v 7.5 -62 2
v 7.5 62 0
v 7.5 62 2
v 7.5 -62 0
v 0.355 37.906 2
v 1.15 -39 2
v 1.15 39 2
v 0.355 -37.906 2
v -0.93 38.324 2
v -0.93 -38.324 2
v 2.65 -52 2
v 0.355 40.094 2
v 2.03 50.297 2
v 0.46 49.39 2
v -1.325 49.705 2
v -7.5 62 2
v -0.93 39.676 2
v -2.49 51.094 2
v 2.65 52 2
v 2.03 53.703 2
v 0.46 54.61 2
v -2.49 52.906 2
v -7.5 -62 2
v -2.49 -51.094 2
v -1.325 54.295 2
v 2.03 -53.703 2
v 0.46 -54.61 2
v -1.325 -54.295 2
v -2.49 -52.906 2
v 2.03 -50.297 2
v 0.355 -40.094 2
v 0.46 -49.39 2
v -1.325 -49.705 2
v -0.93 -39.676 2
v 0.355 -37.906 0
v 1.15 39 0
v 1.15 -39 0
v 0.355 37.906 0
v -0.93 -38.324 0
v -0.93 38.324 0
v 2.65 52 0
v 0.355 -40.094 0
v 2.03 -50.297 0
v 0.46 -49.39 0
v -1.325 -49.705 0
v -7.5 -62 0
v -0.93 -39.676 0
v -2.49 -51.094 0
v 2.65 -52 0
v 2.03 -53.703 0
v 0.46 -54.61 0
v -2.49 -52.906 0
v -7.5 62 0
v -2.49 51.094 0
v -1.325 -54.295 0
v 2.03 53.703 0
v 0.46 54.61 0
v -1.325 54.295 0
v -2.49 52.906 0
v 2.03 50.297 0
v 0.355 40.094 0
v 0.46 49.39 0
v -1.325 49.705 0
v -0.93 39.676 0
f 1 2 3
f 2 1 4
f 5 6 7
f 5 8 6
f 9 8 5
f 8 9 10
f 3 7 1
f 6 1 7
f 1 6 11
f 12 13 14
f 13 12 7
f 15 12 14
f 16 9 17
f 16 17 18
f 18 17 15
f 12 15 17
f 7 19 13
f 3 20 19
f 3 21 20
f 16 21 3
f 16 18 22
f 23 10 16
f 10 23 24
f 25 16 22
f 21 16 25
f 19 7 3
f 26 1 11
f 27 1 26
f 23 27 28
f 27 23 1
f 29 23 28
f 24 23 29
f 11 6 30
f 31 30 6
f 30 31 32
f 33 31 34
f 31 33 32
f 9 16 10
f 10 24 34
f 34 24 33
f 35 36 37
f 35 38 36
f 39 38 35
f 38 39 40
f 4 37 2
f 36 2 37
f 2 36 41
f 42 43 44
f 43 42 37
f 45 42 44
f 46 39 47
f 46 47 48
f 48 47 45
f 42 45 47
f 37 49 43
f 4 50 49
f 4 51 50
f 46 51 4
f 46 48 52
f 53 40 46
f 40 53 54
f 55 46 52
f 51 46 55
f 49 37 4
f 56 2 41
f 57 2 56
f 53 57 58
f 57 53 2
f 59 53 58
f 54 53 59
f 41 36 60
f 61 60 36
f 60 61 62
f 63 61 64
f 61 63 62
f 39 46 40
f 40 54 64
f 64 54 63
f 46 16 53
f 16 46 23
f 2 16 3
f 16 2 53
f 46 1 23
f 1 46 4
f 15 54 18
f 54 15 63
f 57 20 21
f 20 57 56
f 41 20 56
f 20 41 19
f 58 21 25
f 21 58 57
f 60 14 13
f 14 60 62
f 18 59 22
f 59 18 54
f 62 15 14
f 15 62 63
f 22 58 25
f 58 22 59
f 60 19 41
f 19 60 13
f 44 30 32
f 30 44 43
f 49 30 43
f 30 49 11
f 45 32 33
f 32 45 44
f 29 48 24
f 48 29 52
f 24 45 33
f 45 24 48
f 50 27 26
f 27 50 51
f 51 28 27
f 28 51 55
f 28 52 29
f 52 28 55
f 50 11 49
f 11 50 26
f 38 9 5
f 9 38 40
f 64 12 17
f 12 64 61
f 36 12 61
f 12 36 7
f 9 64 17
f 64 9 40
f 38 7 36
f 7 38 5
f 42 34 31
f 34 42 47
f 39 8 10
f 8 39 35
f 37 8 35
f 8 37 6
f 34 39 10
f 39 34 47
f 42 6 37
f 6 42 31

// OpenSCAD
pickscrwDist=78;
scrwDist=104;
y=124;
x=15;
z=2;

m5Dia=5.3;
m2Dia=2.3;


difference(){
translate([-x/2,-y/2,0])cube([x,y,z]);

translate([0,scrwDist/2,0])cylinder(d=m5Dia,h=z);
translate([0,-scrwDist/2,0])cylinder(d=m5Dia,h=z);

translate([0,pickscrwDist/2,0])cylinder(d=m2Dia,h=z);
translate([0,-pickscrwDist/2,0])cylinder(d=m2Dia,h=z);
}
